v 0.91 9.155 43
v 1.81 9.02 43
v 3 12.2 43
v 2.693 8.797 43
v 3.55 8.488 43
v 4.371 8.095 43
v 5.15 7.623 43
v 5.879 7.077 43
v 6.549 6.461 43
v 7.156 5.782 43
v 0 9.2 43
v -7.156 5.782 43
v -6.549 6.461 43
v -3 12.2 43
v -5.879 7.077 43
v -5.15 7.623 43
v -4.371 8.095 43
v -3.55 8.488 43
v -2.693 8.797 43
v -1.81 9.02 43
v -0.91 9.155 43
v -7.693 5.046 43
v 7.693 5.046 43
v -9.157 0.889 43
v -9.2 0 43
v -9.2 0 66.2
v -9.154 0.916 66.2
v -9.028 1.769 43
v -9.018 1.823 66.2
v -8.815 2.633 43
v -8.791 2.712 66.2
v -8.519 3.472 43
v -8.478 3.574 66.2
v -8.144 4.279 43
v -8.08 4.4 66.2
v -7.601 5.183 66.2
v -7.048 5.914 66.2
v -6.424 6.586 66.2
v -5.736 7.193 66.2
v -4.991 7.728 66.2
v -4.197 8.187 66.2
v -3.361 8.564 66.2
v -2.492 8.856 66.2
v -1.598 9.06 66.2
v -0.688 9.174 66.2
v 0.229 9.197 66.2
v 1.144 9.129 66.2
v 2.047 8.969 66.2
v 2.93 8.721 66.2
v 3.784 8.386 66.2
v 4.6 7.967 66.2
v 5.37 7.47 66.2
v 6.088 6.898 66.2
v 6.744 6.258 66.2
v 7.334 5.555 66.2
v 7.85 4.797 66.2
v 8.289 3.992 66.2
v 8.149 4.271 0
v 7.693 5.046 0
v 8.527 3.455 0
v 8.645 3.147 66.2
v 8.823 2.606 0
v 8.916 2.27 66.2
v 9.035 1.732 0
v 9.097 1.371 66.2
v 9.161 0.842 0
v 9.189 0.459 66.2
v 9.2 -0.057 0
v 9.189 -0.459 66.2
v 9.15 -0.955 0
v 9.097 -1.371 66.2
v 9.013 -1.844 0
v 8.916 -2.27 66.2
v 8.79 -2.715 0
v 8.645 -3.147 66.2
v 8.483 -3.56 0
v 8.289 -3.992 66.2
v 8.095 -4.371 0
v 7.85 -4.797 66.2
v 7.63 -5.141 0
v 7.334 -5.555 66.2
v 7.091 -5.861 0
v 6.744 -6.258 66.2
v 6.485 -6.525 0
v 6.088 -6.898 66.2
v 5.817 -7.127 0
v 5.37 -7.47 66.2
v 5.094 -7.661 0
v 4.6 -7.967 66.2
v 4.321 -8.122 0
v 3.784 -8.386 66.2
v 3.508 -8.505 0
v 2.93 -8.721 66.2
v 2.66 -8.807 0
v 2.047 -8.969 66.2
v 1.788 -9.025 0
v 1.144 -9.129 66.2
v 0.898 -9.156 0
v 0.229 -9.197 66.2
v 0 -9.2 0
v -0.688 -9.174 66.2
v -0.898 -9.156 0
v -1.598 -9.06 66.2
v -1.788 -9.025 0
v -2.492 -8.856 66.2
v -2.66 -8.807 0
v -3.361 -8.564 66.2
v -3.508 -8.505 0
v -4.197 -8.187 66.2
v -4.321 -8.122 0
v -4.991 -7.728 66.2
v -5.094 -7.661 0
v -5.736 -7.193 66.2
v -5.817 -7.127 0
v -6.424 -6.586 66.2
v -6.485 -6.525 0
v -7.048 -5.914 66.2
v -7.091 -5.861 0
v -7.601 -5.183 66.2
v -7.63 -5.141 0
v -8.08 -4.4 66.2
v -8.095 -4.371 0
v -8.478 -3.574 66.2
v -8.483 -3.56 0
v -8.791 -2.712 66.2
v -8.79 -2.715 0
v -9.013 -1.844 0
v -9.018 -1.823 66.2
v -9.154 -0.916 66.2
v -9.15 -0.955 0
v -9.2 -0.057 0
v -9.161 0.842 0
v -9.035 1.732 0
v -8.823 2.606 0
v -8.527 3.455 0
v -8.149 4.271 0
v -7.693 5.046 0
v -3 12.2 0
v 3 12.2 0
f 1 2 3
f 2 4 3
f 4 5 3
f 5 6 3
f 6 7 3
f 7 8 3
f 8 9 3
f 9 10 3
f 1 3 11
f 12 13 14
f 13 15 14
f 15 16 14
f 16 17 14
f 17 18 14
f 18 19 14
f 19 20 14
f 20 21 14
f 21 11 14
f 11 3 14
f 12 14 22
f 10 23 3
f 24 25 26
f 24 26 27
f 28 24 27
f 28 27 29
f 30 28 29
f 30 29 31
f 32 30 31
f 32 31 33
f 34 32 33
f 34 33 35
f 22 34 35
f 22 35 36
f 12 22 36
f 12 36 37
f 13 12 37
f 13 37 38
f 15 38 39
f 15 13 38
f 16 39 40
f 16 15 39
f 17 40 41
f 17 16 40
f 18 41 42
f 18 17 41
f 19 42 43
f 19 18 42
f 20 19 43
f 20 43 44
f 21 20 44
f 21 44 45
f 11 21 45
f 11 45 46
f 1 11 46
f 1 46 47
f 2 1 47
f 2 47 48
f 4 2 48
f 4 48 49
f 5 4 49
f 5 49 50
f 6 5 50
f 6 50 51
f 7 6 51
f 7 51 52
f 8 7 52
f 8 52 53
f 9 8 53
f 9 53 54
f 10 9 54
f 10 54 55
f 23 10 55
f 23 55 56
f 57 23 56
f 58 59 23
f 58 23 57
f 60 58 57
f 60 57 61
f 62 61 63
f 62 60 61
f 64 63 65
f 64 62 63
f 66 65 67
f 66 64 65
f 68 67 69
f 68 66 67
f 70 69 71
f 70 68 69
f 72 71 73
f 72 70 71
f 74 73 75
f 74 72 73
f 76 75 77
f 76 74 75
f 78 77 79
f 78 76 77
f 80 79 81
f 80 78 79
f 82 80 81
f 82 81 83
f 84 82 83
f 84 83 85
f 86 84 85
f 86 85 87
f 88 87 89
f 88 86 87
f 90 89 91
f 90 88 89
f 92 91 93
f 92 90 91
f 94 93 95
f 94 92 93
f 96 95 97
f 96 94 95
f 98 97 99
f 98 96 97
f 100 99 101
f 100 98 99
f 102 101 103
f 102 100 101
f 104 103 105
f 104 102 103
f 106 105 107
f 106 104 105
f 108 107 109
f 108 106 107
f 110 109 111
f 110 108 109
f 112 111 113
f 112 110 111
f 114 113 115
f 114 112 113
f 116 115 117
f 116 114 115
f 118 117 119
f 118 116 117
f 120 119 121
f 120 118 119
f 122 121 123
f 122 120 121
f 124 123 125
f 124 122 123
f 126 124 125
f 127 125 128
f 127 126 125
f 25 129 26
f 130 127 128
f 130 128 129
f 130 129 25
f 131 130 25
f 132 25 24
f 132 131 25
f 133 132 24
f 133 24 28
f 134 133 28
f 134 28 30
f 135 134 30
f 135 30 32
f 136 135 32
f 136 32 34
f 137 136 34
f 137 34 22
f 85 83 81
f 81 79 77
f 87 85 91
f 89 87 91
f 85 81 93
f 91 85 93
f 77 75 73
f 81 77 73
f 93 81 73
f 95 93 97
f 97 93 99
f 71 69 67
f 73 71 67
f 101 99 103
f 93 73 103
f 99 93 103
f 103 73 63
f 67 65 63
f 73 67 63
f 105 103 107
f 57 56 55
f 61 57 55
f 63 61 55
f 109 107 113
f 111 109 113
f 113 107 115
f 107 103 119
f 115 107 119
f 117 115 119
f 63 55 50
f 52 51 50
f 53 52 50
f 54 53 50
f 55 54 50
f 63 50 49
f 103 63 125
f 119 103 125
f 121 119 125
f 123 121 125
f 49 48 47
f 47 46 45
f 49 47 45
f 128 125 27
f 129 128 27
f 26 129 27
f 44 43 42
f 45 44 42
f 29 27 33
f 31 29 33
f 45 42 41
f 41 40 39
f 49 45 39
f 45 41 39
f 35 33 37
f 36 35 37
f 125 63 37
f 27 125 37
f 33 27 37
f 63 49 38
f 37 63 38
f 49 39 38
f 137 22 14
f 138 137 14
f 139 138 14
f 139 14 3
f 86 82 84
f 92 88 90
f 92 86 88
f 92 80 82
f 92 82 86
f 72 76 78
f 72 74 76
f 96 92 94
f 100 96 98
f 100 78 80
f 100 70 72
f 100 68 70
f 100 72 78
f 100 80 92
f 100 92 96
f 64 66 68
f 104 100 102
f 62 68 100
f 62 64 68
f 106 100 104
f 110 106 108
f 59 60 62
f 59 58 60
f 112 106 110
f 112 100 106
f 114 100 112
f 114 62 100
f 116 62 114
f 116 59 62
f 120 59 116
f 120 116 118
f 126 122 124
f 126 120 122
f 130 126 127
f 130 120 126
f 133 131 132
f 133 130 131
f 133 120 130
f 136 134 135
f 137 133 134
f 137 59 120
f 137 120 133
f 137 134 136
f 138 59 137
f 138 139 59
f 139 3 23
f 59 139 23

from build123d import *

# Parameters (mm, degrees)
EXTRUDE_3_DEPTH = 43
SKETCH_3_R      = 9.2
EXTRUDE_4_DEPTH = 66.2


with BuildPart() as part:
    # 草图1 → 凸台-拉伸3 (new body)
    with BuildSketch(Plane.XY):
        with BuildLine():
            Line((-3, 12.2), (3, 12.2))
            Line((3, 12.2), (7.692674554, 5.046063634))
            ThreePointArc((7.692674554, 5.046063634), (0, -9.2), (-7.692674554, 5.046063634))
            Line((-7.692674554, 5.046063634), (-3, 12.2))
        make_face()
    extrude(amount=EXTRUDE_3_DEPTH)

    # 草图3 → 凸台-拉伸4 (add)
    with BuildSketch(Plane(origin=(0, 0, 0), x_dir=(-1, 0, 0), z_dir=(0, 0, -1))):
        Circle(SKETCH_3_R)
    extrude(amount=-EXTRUDE_4_DEPTH)


solid = part.part
